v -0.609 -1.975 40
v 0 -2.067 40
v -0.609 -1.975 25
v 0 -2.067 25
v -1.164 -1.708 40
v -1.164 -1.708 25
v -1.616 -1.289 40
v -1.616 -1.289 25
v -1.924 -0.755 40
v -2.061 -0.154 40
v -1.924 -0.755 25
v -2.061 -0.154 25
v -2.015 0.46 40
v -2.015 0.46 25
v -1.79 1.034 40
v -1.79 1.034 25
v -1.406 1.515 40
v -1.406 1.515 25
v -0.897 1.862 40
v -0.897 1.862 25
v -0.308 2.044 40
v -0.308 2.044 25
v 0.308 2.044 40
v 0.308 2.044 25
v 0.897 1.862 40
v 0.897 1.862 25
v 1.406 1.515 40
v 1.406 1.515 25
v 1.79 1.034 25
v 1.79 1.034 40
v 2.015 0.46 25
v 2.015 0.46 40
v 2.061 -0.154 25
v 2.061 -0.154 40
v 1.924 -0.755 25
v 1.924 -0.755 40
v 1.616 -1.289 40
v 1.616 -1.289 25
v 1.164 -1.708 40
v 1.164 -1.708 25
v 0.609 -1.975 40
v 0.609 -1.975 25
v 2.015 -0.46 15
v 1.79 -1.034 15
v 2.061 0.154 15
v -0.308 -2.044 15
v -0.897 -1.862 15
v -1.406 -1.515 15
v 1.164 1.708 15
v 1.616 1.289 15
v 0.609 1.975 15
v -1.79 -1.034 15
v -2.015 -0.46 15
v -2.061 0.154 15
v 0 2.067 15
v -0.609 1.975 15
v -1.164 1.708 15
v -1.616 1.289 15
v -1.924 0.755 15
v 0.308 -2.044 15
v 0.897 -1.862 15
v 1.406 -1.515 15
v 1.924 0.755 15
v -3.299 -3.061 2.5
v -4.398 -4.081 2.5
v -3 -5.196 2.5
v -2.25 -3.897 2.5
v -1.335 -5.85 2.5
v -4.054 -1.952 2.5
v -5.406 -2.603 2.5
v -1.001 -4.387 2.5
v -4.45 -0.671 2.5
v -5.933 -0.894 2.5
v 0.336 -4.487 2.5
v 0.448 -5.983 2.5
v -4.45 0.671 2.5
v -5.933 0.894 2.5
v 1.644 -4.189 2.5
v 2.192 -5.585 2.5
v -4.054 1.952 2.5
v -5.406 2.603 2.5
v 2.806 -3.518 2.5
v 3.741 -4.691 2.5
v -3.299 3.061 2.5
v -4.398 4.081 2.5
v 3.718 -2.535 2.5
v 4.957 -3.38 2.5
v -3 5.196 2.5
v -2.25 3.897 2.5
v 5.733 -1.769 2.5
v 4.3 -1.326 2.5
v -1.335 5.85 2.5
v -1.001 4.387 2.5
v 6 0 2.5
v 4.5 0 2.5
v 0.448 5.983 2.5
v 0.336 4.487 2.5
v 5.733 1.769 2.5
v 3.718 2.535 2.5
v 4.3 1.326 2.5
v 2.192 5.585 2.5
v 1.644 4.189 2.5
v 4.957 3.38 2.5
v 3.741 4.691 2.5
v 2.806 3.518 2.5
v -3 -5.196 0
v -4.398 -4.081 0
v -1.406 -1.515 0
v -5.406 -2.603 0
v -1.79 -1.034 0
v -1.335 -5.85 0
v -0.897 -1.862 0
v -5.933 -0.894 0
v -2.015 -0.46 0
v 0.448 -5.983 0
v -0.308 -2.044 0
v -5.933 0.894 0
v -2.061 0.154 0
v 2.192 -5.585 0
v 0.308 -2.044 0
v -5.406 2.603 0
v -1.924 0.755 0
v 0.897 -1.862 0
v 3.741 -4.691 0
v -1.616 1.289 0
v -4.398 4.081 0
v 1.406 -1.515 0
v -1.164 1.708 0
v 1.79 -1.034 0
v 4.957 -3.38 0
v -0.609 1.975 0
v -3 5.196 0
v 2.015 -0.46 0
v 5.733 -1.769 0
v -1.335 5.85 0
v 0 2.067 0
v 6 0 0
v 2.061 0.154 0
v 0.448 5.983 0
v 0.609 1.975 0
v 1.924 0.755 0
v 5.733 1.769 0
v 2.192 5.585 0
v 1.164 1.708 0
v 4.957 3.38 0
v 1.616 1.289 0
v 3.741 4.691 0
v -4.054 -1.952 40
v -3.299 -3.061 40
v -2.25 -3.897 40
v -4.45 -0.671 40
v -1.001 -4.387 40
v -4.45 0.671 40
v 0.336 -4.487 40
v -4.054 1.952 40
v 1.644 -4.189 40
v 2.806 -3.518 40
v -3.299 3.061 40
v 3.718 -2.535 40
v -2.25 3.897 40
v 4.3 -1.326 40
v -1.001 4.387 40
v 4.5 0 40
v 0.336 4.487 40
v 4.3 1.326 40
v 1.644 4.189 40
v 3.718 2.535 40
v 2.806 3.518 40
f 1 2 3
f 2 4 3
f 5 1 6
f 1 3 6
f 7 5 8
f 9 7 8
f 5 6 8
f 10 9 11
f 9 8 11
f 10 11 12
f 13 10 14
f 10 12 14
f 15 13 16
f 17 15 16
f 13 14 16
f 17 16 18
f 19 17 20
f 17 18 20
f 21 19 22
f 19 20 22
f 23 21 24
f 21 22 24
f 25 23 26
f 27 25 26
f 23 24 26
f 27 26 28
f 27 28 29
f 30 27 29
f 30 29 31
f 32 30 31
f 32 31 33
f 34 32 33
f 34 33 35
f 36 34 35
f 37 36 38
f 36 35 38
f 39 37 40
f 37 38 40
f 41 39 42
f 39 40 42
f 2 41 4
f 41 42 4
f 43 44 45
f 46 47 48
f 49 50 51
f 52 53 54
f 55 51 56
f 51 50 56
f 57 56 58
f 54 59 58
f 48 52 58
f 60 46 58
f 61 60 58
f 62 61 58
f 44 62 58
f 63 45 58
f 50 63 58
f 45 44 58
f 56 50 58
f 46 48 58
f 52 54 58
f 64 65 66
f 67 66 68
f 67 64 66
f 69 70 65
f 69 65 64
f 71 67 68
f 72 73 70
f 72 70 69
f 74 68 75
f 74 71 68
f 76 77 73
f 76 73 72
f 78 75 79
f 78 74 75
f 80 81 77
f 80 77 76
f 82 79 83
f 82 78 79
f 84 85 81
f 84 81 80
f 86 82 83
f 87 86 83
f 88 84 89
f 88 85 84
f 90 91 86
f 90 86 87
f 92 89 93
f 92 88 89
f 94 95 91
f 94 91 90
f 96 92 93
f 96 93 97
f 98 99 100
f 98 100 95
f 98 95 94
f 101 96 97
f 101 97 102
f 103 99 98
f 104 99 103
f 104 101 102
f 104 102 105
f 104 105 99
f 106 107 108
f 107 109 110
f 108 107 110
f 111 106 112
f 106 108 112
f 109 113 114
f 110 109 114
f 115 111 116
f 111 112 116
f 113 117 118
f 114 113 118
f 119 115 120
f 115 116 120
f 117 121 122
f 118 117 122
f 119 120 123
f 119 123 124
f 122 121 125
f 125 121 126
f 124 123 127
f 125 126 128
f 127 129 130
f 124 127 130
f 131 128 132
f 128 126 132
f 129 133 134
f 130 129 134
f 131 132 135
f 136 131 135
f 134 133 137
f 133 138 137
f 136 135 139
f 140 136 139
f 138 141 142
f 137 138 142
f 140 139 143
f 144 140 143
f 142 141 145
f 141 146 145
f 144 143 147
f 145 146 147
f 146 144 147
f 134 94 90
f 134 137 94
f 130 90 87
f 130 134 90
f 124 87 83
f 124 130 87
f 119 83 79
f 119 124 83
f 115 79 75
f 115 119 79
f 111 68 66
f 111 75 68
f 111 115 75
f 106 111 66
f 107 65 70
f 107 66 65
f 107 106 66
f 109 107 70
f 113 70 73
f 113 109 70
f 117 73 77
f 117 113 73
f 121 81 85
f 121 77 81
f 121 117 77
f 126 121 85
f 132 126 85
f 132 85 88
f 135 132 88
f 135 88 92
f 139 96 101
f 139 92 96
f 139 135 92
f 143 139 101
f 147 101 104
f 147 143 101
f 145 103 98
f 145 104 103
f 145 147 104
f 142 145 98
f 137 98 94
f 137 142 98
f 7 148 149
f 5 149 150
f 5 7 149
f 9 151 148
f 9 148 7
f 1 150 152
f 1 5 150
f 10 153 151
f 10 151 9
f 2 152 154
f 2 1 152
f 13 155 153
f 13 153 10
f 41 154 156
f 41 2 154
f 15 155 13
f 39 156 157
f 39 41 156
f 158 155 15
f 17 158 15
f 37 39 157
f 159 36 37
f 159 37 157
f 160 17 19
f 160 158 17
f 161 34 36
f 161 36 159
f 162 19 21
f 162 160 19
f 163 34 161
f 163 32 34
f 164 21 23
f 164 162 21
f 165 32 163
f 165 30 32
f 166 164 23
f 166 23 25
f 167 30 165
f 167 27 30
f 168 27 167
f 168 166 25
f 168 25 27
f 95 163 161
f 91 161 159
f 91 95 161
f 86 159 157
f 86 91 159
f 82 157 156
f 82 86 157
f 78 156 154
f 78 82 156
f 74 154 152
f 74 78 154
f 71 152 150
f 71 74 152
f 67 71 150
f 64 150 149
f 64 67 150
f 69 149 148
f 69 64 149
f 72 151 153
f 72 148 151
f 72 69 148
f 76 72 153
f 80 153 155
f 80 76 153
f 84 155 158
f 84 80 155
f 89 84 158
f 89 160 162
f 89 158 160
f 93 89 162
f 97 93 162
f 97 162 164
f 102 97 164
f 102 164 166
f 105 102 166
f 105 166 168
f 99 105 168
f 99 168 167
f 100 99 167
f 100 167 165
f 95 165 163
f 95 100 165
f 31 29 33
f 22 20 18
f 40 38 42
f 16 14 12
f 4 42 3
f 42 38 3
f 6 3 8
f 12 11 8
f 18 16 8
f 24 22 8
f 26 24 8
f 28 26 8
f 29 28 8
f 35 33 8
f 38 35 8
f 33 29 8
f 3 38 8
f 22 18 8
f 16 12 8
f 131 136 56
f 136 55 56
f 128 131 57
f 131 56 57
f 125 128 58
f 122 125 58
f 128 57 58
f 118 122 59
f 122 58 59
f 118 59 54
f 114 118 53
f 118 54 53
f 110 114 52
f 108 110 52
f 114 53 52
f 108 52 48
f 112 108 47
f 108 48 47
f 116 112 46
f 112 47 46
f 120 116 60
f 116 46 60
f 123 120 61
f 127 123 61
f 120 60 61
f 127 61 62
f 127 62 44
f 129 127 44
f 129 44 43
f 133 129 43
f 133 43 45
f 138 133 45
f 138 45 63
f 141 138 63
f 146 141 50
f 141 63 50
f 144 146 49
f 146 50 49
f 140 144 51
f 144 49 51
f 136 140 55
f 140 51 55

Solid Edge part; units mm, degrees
sketch "Sketch1" plane through (0, 0, 0) normal (0, 0, 1) x (1, 0, 0)
  circle A0 centre (0, 0) radius 4.5
  dimension "D1" = 9
extrude "Protrusion1" add sketch "Sketch1" along normal blind 40
sketch "Sketch2" plane through (0, 0, 0) normal (0, 0, 1) x (1, 0, 0)
  circle A0 centre (0, 0) radius 6
  dimension "D1" = 12
extrude "Extrusionsausprägung_2" add sketch "Sketch2" along normal blind 2.5
hole "Bohrung_3" at (0, 0, 0) direction (0, 0, 1) diameter 4.134 depth 15
hole "Bohrung_4" at (0, 0, 40) direction (0, 0, -1) diameter 4.134 depth 15
properties part number "21" material "Aluminiumlegierung:3.0205, Al 99.0, EN-AW 1200"
